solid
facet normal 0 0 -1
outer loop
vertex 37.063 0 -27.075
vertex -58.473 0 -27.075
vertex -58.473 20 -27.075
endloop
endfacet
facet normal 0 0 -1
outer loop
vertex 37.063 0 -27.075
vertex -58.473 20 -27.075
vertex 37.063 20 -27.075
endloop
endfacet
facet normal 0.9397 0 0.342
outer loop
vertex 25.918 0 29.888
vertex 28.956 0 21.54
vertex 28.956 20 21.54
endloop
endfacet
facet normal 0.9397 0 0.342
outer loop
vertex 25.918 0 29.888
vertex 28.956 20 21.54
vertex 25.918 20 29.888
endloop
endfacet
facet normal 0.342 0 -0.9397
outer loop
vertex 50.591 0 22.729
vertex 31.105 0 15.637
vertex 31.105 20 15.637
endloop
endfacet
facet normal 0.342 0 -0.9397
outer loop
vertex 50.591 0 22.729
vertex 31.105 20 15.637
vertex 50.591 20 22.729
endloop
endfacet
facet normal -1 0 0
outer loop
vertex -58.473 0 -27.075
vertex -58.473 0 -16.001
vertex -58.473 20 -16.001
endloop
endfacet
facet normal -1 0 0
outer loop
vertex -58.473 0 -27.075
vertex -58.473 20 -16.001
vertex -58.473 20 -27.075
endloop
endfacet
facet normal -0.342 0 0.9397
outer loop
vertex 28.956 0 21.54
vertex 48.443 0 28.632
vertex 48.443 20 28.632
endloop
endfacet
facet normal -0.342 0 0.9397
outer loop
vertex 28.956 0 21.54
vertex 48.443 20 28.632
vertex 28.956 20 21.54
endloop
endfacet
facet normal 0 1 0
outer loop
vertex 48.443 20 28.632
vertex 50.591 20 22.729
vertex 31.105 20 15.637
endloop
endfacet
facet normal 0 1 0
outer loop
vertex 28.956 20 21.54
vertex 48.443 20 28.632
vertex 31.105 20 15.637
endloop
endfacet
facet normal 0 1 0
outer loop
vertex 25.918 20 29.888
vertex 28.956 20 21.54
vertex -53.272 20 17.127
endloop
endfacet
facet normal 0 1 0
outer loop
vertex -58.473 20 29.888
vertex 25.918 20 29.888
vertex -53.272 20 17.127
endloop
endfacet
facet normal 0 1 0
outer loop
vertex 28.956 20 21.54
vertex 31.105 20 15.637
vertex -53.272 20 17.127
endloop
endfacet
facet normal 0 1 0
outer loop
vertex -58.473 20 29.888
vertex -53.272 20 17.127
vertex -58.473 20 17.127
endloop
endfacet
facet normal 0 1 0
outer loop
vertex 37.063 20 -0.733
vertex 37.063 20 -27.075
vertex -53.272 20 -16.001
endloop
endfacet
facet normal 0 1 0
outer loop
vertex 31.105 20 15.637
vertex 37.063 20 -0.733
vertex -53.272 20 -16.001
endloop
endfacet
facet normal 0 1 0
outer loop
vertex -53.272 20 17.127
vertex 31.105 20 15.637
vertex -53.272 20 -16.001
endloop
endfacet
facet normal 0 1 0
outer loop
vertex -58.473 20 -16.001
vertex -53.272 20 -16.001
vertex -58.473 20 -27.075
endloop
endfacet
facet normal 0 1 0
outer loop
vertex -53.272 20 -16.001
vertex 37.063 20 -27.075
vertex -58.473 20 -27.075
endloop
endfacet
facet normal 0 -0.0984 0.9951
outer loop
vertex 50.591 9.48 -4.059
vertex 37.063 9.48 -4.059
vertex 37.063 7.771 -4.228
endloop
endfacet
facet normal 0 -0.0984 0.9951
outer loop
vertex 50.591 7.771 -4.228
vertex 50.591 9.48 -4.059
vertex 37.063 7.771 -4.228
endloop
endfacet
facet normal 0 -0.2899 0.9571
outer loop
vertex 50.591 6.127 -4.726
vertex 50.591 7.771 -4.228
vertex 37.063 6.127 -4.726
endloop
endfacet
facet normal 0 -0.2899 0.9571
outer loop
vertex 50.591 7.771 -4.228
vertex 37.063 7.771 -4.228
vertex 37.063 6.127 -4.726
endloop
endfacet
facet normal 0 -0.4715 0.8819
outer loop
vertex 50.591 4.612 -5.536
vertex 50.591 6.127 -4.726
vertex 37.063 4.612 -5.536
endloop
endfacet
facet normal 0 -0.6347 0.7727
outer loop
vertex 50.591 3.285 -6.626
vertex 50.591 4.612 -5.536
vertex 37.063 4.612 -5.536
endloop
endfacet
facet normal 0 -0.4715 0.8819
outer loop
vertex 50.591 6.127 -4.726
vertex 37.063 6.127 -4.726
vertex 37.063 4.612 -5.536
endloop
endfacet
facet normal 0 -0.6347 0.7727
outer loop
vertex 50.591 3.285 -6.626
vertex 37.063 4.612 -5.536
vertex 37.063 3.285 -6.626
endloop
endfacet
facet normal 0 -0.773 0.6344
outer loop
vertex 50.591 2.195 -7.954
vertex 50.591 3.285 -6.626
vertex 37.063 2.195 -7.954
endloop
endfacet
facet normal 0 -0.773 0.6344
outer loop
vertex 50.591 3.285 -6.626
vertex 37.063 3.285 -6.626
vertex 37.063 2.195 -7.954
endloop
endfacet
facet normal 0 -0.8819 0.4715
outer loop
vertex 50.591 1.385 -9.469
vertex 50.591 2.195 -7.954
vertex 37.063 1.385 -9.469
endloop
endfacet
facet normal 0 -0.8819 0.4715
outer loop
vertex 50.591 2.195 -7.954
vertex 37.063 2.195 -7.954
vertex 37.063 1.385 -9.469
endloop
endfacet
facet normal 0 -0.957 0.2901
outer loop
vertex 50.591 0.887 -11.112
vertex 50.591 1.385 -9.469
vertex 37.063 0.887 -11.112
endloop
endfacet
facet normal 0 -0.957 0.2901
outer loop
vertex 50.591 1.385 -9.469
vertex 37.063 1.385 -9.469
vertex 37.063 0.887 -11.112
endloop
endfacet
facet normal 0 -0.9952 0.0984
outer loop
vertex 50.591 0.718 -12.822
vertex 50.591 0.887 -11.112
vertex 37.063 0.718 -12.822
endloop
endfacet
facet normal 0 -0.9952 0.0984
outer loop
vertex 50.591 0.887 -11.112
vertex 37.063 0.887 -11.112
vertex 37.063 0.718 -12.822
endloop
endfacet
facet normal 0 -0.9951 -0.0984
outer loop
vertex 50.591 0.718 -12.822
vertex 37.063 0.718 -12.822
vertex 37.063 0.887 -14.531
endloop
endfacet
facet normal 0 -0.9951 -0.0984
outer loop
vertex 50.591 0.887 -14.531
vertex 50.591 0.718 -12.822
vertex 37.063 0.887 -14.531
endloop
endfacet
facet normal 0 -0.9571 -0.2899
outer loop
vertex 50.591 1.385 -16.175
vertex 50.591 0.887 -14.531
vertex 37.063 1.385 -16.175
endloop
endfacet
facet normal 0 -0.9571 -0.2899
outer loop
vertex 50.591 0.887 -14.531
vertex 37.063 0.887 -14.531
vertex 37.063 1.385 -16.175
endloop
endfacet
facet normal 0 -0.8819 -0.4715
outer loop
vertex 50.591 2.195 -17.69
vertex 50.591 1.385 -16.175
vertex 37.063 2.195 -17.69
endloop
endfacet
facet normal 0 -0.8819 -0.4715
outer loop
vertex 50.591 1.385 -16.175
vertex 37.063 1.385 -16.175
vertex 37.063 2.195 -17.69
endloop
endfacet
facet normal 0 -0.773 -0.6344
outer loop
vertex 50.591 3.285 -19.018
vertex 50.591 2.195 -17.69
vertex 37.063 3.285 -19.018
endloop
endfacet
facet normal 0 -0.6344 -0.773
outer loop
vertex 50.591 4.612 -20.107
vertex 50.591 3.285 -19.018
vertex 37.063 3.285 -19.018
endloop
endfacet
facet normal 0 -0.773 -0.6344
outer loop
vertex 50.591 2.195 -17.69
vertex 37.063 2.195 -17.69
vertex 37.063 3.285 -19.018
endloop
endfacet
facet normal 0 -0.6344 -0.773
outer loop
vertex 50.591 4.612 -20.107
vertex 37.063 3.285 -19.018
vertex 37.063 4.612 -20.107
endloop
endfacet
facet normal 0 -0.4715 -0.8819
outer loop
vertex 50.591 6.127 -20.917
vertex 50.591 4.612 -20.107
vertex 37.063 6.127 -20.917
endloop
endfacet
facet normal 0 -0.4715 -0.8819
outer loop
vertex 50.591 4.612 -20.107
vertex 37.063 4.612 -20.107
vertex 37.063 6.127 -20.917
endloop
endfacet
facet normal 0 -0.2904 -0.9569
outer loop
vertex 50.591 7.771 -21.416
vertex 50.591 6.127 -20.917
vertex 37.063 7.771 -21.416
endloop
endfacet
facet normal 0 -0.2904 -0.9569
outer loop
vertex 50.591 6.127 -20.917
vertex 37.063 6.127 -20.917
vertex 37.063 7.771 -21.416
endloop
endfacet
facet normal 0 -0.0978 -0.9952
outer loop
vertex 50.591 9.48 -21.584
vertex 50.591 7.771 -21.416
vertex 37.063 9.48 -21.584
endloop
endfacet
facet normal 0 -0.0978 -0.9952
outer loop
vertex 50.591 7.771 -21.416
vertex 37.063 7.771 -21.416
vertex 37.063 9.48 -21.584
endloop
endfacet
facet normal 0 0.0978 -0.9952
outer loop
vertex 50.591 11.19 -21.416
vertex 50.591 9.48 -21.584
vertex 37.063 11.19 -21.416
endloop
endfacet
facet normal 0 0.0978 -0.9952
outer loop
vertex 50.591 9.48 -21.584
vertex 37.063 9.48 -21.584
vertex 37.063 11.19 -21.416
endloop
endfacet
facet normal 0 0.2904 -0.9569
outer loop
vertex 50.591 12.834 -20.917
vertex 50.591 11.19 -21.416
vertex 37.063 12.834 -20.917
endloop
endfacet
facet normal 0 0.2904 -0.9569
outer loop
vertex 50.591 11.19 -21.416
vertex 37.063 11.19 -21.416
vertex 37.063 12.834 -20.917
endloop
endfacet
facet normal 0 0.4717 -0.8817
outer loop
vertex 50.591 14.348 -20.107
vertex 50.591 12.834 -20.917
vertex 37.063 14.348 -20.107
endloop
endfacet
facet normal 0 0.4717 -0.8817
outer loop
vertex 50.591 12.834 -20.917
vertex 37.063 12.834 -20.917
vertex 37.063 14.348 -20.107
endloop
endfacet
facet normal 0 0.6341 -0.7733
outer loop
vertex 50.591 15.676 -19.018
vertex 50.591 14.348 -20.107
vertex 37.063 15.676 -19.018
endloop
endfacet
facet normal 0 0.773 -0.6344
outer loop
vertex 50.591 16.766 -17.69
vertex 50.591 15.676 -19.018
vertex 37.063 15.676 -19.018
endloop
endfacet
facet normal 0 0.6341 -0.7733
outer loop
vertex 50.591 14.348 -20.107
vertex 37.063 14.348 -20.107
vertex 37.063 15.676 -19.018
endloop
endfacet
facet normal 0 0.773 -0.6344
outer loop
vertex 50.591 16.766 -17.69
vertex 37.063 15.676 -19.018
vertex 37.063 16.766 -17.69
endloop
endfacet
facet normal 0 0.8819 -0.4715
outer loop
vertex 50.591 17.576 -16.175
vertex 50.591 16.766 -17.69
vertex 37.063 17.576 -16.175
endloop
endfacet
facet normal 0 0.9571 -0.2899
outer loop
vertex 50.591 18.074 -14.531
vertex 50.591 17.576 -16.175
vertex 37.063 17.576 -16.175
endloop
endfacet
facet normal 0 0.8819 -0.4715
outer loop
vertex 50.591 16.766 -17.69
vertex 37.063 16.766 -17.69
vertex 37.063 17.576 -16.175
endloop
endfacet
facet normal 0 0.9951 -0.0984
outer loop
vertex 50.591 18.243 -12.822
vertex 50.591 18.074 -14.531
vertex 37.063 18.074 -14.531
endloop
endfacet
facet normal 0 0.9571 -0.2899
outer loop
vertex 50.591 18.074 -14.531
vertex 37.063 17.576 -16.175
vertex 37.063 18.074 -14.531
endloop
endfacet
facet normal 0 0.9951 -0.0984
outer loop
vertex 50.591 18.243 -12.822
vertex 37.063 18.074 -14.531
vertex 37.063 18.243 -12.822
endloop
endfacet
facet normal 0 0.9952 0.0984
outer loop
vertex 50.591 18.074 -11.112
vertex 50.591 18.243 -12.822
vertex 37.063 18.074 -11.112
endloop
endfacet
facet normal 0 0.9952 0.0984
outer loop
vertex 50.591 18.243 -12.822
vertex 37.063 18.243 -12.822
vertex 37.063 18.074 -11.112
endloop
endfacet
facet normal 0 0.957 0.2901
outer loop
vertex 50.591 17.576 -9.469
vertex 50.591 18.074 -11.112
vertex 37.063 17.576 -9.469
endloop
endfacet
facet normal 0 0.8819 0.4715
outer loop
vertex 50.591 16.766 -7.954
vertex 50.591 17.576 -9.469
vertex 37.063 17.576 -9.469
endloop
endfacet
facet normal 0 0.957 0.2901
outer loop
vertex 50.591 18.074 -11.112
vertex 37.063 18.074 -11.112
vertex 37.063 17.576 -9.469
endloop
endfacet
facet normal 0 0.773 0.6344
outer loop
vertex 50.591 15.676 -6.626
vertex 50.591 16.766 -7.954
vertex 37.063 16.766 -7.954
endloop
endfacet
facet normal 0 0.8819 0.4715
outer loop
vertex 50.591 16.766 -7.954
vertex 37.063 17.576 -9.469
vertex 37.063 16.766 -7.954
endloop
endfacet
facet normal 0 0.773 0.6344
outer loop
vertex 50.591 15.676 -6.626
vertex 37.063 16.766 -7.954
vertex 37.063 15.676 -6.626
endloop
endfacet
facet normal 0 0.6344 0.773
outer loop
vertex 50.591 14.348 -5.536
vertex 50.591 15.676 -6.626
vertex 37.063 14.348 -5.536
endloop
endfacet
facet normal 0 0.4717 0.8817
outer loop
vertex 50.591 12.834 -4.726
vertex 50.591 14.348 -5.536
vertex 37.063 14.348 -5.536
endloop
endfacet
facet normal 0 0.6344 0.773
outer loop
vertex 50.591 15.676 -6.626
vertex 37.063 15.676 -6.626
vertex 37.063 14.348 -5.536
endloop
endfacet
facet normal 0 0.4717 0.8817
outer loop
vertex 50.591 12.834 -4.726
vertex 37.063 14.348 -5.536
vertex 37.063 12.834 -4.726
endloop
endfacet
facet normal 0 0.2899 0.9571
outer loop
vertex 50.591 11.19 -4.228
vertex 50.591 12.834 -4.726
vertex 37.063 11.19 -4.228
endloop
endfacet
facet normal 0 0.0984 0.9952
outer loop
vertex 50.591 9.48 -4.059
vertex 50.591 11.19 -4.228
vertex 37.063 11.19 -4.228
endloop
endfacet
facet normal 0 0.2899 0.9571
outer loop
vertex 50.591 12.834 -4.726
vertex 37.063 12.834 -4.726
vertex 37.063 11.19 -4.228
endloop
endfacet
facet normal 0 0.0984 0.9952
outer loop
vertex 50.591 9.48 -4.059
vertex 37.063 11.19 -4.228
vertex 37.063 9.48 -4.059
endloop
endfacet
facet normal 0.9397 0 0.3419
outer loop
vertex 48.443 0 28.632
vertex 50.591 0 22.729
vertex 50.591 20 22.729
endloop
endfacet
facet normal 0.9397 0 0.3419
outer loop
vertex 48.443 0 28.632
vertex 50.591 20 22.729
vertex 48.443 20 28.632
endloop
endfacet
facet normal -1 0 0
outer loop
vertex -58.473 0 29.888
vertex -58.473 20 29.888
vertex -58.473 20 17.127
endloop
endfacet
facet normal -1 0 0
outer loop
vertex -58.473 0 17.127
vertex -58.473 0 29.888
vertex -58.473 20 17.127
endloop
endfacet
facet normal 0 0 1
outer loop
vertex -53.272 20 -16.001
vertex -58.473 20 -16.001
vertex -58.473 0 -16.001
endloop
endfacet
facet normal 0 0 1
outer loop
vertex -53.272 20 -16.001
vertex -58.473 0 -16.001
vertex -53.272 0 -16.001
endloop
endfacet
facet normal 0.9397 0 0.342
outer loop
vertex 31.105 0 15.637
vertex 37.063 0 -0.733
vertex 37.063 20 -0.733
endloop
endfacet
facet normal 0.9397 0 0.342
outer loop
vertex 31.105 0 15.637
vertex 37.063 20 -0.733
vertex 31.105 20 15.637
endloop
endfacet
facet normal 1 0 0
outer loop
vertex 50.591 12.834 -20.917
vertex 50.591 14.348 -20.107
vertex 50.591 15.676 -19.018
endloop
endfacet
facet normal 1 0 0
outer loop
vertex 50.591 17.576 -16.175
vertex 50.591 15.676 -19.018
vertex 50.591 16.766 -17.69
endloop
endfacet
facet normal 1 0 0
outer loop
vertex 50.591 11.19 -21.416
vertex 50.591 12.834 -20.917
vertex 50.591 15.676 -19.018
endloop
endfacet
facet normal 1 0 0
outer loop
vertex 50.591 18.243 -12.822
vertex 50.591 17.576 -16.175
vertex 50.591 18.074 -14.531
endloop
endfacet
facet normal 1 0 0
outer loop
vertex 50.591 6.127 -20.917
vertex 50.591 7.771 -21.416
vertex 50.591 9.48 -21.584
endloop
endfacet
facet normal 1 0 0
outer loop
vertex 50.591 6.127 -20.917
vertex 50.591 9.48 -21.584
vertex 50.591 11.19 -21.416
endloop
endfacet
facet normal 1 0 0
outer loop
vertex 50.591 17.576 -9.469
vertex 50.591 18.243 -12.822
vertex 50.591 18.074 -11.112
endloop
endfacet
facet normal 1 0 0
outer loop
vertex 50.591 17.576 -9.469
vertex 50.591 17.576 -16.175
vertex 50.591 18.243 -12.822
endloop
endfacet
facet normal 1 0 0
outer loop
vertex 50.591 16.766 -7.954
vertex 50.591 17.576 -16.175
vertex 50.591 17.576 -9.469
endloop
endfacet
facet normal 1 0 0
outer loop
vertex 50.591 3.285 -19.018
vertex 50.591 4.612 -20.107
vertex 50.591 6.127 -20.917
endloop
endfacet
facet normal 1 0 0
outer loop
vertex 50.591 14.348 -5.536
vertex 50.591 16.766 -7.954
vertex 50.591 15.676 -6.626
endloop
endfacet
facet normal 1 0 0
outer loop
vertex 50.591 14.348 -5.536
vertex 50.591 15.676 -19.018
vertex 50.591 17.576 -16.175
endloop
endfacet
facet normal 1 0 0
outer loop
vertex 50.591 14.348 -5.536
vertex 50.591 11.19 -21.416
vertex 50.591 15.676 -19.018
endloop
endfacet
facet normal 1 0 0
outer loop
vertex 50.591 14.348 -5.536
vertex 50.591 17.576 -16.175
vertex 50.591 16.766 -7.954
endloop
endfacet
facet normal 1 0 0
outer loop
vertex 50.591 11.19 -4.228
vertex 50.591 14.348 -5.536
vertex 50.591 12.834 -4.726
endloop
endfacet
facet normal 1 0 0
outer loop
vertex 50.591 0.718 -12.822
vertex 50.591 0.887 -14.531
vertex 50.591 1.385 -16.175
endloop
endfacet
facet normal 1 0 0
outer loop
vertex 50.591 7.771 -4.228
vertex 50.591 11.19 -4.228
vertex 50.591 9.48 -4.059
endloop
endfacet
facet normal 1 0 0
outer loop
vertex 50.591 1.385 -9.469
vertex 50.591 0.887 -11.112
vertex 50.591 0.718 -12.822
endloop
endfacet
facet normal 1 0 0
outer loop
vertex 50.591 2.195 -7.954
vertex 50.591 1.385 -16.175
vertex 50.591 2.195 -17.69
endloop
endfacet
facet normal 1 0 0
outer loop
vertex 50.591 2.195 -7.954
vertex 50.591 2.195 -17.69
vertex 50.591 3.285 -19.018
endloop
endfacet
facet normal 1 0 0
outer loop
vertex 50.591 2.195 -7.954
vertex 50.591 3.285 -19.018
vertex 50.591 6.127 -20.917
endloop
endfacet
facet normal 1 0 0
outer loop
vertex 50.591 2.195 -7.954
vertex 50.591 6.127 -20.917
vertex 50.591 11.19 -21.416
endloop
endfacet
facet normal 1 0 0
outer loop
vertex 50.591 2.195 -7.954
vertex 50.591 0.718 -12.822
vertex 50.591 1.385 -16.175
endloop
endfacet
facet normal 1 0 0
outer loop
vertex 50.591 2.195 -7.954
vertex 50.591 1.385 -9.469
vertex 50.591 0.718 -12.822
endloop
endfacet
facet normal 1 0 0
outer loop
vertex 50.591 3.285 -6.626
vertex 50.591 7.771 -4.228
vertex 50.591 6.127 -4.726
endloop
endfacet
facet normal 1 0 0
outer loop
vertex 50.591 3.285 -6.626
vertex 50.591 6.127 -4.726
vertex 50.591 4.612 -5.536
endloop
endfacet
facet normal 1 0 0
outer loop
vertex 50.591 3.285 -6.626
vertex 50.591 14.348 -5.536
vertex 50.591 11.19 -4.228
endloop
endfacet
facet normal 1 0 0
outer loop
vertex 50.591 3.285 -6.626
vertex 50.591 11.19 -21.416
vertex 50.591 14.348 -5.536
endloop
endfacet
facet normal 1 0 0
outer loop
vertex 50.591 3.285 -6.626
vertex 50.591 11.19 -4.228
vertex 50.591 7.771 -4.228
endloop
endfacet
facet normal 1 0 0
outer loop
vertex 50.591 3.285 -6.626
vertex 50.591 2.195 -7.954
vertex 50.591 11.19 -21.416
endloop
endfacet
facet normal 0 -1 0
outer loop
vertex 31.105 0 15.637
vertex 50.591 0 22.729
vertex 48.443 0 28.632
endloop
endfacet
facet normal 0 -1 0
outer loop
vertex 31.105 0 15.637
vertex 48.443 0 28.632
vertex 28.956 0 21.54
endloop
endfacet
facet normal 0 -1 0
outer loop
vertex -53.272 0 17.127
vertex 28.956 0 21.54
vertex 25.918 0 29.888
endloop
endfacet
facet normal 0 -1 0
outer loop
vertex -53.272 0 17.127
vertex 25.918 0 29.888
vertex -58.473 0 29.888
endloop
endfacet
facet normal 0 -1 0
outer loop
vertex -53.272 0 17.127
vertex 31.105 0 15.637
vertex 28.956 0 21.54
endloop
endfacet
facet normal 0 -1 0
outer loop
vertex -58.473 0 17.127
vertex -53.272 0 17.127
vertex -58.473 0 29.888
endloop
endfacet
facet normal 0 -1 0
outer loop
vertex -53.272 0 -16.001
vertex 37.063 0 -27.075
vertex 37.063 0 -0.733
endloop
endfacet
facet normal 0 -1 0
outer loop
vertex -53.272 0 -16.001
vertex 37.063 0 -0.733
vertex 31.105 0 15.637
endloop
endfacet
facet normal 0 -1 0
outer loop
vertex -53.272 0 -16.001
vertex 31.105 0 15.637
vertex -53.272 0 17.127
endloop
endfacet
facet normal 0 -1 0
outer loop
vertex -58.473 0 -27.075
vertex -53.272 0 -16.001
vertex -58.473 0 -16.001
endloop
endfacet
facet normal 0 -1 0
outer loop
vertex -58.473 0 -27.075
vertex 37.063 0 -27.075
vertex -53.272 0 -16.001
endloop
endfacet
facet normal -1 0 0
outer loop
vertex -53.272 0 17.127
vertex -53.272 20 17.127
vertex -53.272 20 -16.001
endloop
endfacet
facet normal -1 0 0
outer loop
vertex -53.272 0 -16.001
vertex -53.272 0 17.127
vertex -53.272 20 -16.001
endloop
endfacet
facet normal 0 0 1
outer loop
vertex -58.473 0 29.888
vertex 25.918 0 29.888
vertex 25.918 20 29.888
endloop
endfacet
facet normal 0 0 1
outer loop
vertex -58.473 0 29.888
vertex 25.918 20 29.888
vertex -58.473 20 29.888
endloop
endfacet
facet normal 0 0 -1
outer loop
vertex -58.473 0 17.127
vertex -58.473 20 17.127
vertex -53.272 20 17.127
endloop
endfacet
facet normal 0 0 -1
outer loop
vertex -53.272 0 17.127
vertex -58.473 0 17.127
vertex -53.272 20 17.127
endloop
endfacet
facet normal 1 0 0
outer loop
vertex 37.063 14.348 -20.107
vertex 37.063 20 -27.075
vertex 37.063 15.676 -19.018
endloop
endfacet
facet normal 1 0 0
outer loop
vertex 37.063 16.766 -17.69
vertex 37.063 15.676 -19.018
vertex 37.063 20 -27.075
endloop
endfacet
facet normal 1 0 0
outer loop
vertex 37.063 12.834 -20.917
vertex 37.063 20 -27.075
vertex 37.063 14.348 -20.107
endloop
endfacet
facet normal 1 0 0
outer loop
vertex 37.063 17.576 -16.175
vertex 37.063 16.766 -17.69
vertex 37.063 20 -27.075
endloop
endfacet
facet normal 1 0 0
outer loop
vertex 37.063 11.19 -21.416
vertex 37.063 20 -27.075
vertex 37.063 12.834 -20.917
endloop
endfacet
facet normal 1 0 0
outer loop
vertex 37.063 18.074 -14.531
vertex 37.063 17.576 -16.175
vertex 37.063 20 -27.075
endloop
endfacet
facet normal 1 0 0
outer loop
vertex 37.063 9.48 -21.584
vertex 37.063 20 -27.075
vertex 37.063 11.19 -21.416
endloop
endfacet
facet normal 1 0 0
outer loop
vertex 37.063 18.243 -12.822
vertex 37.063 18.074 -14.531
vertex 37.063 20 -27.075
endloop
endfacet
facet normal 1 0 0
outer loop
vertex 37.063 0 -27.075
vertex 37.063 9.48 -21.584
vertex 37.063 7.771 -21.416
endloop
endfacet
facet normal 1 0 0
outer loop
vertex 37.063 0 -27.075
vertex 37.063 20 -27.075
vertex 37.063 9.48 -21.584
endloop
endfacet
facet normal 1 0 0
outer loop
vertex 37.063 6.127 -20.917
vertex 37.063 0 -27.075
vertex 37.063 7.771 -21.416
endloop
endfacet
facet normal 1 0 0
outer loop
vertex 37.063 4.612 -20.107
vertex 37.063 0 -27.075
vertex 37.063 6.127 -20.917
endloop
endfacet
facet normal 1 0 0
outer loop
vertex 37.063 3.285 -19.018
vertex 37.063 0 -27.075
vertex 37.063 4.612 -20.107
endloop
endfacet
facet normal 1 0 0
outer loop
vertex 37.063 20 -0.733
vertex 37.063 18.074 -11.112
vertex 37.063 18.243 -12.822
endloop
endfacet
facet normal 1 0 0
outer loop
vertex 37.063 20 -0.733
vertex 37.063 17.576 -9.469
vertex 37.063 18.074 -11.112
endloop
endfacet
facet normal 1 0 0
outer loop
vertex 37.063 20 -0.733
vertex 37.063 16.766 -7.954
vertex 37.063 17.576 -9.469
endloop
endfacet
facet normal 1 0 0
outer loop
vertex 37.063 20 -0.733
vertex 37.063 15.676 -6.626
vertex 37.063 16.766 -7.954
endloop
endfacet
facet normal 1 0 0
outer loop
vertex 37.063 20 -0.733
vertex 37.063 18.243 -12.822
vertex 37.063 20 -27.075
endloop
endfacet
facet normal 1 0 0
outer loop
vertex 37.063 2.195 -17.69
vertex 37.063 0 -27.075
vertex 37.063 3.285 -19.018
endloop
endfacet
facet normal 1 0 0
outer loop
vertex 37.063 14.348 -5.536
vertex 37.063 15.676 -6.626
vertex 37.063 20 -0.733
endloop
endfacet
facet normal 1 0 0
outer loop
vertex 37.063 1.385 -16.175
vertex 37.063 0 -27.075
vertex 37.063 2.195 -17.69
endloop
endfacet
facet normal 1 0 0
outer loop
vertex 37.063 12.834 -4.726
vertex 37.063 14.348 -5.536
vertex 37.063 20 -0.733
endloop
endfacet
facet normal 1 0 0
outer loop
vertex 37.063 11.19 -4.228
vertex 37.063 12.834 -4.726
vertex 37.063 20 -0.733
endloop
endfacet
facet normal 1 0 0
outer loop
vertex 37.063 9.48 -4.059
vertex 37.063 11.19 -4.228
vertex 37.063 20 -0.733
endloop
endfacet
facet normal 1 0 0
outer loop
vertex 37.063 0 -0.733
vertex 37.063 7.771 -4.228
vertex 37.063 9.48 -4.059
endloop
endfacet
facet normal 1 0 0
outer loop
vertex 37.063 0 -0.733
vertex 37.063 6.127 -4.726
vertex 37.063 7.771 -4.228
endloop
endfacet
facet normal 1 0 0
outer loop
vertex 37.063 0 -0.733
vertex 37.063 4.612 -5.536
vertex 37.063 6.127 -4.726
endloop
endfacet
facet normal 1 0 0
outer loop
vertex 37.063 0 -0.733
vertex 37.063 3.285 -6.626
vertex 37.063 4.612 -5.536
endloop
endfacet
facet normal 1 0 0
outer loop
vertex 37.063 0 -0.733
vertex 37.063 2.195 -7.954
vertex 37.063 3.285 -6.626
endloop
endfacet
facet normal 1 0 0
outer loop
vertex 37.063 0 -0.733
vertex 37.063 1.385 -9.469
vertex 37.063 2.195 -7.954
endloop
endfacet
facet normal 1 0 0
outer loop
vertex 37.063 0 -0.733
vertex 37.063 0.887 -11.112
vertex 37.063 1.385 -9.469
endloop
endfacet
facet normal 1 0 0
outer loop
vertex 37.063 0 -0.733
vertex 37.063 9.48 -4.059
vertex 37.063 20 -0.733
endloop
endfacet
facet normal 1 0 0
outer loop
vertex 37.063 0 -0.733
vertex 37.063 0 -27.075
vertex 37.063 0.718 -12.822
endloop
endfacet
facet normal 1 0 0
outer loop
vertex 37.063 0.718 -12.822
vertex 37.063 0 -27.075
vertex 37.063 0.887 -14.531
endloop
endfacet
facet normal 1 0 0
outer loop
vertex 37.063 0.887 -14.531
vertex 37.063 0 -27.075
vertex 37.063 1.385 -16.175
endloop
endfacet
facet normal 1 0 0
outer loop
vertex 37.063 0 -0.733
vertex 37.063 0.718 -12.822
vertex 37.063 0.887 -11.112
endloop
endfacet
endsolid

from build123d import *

# Parameters (mm, degrees)
BOSS_EXTRUDE1_DEPTH = 20
SKETCH2_R           = 8.762238692
BOSS_EXTRUDE2_DEPTH = 13.528179
SKETCH3_W           = 5.200821941
SKETCH3_H           = 33.128455843
CUT_EXTRUDE1_DEPTH  = 69.647143148


with BuildPart() as part:
    # Sketch1 → Boss-Extrude1 (new body)
    with BuildSketch(Plane(origin=(0, 0, 0), x_dir=(1, 0, 0), z_dir=(0, 1, 0))):
        Polygon((37.062970991, 27.075407166), (37.062970991, 0.732918261), (31.104831338, -15.636935896), (50.591147993, -22.729375134), (48.442612656, -28.632427455), (28.956296002, -21.539988217), (25.917709331, -29.888436482), (-58.473170148, -29.888436482), (-58.473170148, 27.075407166), align=None)
    extrude(amount=BOSS_EXTRUDE1_DEPTH)

    # Sketch2 → Boss-Extrude2 (add)
    with BuildSketch(Plane(origin=(37.062970991, 0, 0), x_dir=(0, 0, -1), z_dir=(1, 0, 0))):
        with Locations(Location((12.821734178, 9.480390425, 0), (0, 0, 180))):
            Circle(SKETCH2_R)
    extrude(amount=BOSS_EXTRUDE2_DEPTH)

    # Sketch3 → Cut-Extrude1 (cut, through all)
    with BuildSketch(Plane(origin=(0, 20, 0), x_dir=(1, 0, 0), z_dir=(0, 1, 0))):
        with Locations((-55.872759178, -0.563117172)):
            Rectangle(SKETCH3_W, SKETCH3_H)
    extrude(amount=-CUT_EXTRUDE1_DEPTH, mode=Mode.SUBTRACT)


solid = part.part
